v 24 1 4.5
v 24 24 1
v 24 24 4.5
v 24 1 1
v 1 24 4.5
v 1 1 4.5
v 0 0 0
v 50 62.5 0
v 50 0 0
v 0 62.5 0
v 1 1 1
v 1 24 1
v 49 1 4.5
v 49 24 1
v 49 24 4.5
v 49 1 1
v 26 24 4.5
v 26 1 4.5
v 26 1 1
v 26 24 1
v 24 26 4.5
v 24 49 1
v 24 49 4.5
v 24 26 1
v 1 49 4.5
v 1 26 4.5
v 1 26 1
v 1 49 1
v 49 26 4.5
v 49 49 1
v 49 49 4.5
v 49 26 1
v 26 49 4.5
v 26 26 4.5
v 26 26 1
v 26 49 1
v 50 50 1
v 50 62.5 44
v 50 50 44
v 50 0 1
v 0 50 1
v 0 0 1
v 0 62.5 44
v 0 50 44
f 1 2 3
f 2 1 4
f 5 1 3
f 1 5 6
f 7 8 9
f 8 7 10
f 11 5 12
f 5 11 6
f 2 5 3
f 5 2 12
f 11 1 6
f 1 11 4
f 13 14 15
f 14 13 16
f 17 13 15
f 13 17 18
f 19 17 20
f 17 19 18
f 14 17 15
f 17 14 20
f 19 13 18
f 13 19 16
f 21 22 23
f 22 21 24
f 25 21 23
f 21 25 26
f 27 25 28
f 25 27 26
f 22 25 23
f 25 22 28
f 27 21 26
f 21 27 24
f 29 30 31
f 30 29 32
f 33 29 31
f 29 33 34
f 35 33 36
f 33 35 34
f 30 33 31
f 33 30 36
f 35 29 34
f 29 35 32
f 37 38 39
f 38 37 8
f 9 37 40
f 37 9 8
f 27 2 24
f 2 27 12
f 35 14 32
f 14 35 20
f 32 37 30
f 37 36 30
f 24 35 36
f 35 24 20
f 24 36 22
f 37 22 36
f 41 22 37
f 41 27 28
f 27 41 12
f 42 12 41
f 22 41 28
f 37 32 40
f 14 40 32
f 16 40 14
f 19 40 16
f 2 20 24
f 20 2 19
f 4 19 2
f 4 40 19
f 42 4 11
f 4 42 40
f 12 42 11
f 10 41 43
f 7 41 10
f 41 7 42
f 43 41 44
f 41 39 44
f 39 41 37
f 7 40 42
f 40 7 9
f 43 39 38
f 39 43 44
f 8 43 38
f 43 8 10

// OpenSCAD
//translate([0,0,0]) color("LightGray") square([25,25],false);
//translate([25,0,0]) color("LightGray") square([25,25],false);
//translate([0,25,0]) color("LightGray") square([25,25],false);
//translate([25,25,0]) color("LightGray") square([25,25],false);

scale([2,2,2]) {
    //translate([0,50,0]) color("Gray") square([50,12.5],false);
    //translate([50,0,0]) color("Gray") square([12.5,50],false);
}

color("LightGray") {
    translate([1,1,0]) cube([23,23,4.5]);
    translate([25+1,1,0]) cube([23,23,4.5]);
    translate([1,25+1,0]) cube([23,23,4.5]);
    translate([25+1,25+1,0]) cube([23,23,4.5]);
}
color("Grey") {
    cube([50,50,1]);
    translate([0,50,0]) cube([50,12.5,50-6]);
}
